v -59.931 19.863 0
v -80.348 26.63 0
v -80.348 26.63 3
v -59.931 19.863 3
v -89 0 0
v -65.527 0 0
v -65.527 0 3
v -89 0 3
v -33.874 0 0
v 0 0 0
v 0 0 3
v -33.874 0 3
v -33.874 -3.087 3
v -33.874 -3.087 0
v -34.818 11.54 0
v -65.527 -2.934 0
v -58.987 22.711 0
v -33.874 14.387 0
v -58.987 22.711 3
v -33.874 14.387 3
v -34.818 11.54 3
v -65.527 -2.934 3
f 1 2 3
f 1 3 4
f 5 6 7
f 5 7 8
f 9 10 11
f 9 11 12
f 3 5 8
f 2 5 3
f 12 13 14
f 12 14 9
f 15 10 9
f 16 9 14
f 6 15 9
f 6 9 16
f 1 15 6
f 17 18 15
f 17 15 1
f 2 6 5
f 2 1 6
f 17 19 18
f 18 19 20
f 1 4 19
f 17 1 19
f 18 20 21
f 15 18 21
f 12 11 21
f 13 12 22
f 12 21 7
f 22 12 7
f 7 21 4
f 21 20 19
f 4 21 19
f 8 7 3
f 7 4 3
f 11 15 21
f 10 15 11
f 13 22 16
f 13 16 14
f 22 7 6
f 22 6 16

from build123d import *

# Parameters (mm, degrees)
BOSS_EXTRUDE1_DEPTH = 3
BOSS_EXTRUDE2_DEPTH = 3


with BuildPart() as part:
    # Sketch1 → Boss-Extrude1 (new body)
    with BuildSketch(Plane.XY):
        Polygon((0, 0), (-89, 0), (-80.347524158, 26.629582456), align=None)
    extrude(amount=BOSS_EXTRUDE1_DEPTH)

    # Sketch3 → Boss-Extrude2 (add)
    with BuildSketch(Plane.XY.offset(3)):
        Polygon((-65.527189586, 0), (-65.527189586, -2.933860522), (-33.874345064, -3.087202401), (-33.874345064, 0), align=None)
        Polygon((-59.931116708, 19.862971894), (-58.987312784, 22.710643601), (-33.874345064, 14.38745192), (-34.818148987, 11.539780213), align=None)
    extrude(amount=-BOSS_EXTRUDE2_DEPTH)


solid = part.part
